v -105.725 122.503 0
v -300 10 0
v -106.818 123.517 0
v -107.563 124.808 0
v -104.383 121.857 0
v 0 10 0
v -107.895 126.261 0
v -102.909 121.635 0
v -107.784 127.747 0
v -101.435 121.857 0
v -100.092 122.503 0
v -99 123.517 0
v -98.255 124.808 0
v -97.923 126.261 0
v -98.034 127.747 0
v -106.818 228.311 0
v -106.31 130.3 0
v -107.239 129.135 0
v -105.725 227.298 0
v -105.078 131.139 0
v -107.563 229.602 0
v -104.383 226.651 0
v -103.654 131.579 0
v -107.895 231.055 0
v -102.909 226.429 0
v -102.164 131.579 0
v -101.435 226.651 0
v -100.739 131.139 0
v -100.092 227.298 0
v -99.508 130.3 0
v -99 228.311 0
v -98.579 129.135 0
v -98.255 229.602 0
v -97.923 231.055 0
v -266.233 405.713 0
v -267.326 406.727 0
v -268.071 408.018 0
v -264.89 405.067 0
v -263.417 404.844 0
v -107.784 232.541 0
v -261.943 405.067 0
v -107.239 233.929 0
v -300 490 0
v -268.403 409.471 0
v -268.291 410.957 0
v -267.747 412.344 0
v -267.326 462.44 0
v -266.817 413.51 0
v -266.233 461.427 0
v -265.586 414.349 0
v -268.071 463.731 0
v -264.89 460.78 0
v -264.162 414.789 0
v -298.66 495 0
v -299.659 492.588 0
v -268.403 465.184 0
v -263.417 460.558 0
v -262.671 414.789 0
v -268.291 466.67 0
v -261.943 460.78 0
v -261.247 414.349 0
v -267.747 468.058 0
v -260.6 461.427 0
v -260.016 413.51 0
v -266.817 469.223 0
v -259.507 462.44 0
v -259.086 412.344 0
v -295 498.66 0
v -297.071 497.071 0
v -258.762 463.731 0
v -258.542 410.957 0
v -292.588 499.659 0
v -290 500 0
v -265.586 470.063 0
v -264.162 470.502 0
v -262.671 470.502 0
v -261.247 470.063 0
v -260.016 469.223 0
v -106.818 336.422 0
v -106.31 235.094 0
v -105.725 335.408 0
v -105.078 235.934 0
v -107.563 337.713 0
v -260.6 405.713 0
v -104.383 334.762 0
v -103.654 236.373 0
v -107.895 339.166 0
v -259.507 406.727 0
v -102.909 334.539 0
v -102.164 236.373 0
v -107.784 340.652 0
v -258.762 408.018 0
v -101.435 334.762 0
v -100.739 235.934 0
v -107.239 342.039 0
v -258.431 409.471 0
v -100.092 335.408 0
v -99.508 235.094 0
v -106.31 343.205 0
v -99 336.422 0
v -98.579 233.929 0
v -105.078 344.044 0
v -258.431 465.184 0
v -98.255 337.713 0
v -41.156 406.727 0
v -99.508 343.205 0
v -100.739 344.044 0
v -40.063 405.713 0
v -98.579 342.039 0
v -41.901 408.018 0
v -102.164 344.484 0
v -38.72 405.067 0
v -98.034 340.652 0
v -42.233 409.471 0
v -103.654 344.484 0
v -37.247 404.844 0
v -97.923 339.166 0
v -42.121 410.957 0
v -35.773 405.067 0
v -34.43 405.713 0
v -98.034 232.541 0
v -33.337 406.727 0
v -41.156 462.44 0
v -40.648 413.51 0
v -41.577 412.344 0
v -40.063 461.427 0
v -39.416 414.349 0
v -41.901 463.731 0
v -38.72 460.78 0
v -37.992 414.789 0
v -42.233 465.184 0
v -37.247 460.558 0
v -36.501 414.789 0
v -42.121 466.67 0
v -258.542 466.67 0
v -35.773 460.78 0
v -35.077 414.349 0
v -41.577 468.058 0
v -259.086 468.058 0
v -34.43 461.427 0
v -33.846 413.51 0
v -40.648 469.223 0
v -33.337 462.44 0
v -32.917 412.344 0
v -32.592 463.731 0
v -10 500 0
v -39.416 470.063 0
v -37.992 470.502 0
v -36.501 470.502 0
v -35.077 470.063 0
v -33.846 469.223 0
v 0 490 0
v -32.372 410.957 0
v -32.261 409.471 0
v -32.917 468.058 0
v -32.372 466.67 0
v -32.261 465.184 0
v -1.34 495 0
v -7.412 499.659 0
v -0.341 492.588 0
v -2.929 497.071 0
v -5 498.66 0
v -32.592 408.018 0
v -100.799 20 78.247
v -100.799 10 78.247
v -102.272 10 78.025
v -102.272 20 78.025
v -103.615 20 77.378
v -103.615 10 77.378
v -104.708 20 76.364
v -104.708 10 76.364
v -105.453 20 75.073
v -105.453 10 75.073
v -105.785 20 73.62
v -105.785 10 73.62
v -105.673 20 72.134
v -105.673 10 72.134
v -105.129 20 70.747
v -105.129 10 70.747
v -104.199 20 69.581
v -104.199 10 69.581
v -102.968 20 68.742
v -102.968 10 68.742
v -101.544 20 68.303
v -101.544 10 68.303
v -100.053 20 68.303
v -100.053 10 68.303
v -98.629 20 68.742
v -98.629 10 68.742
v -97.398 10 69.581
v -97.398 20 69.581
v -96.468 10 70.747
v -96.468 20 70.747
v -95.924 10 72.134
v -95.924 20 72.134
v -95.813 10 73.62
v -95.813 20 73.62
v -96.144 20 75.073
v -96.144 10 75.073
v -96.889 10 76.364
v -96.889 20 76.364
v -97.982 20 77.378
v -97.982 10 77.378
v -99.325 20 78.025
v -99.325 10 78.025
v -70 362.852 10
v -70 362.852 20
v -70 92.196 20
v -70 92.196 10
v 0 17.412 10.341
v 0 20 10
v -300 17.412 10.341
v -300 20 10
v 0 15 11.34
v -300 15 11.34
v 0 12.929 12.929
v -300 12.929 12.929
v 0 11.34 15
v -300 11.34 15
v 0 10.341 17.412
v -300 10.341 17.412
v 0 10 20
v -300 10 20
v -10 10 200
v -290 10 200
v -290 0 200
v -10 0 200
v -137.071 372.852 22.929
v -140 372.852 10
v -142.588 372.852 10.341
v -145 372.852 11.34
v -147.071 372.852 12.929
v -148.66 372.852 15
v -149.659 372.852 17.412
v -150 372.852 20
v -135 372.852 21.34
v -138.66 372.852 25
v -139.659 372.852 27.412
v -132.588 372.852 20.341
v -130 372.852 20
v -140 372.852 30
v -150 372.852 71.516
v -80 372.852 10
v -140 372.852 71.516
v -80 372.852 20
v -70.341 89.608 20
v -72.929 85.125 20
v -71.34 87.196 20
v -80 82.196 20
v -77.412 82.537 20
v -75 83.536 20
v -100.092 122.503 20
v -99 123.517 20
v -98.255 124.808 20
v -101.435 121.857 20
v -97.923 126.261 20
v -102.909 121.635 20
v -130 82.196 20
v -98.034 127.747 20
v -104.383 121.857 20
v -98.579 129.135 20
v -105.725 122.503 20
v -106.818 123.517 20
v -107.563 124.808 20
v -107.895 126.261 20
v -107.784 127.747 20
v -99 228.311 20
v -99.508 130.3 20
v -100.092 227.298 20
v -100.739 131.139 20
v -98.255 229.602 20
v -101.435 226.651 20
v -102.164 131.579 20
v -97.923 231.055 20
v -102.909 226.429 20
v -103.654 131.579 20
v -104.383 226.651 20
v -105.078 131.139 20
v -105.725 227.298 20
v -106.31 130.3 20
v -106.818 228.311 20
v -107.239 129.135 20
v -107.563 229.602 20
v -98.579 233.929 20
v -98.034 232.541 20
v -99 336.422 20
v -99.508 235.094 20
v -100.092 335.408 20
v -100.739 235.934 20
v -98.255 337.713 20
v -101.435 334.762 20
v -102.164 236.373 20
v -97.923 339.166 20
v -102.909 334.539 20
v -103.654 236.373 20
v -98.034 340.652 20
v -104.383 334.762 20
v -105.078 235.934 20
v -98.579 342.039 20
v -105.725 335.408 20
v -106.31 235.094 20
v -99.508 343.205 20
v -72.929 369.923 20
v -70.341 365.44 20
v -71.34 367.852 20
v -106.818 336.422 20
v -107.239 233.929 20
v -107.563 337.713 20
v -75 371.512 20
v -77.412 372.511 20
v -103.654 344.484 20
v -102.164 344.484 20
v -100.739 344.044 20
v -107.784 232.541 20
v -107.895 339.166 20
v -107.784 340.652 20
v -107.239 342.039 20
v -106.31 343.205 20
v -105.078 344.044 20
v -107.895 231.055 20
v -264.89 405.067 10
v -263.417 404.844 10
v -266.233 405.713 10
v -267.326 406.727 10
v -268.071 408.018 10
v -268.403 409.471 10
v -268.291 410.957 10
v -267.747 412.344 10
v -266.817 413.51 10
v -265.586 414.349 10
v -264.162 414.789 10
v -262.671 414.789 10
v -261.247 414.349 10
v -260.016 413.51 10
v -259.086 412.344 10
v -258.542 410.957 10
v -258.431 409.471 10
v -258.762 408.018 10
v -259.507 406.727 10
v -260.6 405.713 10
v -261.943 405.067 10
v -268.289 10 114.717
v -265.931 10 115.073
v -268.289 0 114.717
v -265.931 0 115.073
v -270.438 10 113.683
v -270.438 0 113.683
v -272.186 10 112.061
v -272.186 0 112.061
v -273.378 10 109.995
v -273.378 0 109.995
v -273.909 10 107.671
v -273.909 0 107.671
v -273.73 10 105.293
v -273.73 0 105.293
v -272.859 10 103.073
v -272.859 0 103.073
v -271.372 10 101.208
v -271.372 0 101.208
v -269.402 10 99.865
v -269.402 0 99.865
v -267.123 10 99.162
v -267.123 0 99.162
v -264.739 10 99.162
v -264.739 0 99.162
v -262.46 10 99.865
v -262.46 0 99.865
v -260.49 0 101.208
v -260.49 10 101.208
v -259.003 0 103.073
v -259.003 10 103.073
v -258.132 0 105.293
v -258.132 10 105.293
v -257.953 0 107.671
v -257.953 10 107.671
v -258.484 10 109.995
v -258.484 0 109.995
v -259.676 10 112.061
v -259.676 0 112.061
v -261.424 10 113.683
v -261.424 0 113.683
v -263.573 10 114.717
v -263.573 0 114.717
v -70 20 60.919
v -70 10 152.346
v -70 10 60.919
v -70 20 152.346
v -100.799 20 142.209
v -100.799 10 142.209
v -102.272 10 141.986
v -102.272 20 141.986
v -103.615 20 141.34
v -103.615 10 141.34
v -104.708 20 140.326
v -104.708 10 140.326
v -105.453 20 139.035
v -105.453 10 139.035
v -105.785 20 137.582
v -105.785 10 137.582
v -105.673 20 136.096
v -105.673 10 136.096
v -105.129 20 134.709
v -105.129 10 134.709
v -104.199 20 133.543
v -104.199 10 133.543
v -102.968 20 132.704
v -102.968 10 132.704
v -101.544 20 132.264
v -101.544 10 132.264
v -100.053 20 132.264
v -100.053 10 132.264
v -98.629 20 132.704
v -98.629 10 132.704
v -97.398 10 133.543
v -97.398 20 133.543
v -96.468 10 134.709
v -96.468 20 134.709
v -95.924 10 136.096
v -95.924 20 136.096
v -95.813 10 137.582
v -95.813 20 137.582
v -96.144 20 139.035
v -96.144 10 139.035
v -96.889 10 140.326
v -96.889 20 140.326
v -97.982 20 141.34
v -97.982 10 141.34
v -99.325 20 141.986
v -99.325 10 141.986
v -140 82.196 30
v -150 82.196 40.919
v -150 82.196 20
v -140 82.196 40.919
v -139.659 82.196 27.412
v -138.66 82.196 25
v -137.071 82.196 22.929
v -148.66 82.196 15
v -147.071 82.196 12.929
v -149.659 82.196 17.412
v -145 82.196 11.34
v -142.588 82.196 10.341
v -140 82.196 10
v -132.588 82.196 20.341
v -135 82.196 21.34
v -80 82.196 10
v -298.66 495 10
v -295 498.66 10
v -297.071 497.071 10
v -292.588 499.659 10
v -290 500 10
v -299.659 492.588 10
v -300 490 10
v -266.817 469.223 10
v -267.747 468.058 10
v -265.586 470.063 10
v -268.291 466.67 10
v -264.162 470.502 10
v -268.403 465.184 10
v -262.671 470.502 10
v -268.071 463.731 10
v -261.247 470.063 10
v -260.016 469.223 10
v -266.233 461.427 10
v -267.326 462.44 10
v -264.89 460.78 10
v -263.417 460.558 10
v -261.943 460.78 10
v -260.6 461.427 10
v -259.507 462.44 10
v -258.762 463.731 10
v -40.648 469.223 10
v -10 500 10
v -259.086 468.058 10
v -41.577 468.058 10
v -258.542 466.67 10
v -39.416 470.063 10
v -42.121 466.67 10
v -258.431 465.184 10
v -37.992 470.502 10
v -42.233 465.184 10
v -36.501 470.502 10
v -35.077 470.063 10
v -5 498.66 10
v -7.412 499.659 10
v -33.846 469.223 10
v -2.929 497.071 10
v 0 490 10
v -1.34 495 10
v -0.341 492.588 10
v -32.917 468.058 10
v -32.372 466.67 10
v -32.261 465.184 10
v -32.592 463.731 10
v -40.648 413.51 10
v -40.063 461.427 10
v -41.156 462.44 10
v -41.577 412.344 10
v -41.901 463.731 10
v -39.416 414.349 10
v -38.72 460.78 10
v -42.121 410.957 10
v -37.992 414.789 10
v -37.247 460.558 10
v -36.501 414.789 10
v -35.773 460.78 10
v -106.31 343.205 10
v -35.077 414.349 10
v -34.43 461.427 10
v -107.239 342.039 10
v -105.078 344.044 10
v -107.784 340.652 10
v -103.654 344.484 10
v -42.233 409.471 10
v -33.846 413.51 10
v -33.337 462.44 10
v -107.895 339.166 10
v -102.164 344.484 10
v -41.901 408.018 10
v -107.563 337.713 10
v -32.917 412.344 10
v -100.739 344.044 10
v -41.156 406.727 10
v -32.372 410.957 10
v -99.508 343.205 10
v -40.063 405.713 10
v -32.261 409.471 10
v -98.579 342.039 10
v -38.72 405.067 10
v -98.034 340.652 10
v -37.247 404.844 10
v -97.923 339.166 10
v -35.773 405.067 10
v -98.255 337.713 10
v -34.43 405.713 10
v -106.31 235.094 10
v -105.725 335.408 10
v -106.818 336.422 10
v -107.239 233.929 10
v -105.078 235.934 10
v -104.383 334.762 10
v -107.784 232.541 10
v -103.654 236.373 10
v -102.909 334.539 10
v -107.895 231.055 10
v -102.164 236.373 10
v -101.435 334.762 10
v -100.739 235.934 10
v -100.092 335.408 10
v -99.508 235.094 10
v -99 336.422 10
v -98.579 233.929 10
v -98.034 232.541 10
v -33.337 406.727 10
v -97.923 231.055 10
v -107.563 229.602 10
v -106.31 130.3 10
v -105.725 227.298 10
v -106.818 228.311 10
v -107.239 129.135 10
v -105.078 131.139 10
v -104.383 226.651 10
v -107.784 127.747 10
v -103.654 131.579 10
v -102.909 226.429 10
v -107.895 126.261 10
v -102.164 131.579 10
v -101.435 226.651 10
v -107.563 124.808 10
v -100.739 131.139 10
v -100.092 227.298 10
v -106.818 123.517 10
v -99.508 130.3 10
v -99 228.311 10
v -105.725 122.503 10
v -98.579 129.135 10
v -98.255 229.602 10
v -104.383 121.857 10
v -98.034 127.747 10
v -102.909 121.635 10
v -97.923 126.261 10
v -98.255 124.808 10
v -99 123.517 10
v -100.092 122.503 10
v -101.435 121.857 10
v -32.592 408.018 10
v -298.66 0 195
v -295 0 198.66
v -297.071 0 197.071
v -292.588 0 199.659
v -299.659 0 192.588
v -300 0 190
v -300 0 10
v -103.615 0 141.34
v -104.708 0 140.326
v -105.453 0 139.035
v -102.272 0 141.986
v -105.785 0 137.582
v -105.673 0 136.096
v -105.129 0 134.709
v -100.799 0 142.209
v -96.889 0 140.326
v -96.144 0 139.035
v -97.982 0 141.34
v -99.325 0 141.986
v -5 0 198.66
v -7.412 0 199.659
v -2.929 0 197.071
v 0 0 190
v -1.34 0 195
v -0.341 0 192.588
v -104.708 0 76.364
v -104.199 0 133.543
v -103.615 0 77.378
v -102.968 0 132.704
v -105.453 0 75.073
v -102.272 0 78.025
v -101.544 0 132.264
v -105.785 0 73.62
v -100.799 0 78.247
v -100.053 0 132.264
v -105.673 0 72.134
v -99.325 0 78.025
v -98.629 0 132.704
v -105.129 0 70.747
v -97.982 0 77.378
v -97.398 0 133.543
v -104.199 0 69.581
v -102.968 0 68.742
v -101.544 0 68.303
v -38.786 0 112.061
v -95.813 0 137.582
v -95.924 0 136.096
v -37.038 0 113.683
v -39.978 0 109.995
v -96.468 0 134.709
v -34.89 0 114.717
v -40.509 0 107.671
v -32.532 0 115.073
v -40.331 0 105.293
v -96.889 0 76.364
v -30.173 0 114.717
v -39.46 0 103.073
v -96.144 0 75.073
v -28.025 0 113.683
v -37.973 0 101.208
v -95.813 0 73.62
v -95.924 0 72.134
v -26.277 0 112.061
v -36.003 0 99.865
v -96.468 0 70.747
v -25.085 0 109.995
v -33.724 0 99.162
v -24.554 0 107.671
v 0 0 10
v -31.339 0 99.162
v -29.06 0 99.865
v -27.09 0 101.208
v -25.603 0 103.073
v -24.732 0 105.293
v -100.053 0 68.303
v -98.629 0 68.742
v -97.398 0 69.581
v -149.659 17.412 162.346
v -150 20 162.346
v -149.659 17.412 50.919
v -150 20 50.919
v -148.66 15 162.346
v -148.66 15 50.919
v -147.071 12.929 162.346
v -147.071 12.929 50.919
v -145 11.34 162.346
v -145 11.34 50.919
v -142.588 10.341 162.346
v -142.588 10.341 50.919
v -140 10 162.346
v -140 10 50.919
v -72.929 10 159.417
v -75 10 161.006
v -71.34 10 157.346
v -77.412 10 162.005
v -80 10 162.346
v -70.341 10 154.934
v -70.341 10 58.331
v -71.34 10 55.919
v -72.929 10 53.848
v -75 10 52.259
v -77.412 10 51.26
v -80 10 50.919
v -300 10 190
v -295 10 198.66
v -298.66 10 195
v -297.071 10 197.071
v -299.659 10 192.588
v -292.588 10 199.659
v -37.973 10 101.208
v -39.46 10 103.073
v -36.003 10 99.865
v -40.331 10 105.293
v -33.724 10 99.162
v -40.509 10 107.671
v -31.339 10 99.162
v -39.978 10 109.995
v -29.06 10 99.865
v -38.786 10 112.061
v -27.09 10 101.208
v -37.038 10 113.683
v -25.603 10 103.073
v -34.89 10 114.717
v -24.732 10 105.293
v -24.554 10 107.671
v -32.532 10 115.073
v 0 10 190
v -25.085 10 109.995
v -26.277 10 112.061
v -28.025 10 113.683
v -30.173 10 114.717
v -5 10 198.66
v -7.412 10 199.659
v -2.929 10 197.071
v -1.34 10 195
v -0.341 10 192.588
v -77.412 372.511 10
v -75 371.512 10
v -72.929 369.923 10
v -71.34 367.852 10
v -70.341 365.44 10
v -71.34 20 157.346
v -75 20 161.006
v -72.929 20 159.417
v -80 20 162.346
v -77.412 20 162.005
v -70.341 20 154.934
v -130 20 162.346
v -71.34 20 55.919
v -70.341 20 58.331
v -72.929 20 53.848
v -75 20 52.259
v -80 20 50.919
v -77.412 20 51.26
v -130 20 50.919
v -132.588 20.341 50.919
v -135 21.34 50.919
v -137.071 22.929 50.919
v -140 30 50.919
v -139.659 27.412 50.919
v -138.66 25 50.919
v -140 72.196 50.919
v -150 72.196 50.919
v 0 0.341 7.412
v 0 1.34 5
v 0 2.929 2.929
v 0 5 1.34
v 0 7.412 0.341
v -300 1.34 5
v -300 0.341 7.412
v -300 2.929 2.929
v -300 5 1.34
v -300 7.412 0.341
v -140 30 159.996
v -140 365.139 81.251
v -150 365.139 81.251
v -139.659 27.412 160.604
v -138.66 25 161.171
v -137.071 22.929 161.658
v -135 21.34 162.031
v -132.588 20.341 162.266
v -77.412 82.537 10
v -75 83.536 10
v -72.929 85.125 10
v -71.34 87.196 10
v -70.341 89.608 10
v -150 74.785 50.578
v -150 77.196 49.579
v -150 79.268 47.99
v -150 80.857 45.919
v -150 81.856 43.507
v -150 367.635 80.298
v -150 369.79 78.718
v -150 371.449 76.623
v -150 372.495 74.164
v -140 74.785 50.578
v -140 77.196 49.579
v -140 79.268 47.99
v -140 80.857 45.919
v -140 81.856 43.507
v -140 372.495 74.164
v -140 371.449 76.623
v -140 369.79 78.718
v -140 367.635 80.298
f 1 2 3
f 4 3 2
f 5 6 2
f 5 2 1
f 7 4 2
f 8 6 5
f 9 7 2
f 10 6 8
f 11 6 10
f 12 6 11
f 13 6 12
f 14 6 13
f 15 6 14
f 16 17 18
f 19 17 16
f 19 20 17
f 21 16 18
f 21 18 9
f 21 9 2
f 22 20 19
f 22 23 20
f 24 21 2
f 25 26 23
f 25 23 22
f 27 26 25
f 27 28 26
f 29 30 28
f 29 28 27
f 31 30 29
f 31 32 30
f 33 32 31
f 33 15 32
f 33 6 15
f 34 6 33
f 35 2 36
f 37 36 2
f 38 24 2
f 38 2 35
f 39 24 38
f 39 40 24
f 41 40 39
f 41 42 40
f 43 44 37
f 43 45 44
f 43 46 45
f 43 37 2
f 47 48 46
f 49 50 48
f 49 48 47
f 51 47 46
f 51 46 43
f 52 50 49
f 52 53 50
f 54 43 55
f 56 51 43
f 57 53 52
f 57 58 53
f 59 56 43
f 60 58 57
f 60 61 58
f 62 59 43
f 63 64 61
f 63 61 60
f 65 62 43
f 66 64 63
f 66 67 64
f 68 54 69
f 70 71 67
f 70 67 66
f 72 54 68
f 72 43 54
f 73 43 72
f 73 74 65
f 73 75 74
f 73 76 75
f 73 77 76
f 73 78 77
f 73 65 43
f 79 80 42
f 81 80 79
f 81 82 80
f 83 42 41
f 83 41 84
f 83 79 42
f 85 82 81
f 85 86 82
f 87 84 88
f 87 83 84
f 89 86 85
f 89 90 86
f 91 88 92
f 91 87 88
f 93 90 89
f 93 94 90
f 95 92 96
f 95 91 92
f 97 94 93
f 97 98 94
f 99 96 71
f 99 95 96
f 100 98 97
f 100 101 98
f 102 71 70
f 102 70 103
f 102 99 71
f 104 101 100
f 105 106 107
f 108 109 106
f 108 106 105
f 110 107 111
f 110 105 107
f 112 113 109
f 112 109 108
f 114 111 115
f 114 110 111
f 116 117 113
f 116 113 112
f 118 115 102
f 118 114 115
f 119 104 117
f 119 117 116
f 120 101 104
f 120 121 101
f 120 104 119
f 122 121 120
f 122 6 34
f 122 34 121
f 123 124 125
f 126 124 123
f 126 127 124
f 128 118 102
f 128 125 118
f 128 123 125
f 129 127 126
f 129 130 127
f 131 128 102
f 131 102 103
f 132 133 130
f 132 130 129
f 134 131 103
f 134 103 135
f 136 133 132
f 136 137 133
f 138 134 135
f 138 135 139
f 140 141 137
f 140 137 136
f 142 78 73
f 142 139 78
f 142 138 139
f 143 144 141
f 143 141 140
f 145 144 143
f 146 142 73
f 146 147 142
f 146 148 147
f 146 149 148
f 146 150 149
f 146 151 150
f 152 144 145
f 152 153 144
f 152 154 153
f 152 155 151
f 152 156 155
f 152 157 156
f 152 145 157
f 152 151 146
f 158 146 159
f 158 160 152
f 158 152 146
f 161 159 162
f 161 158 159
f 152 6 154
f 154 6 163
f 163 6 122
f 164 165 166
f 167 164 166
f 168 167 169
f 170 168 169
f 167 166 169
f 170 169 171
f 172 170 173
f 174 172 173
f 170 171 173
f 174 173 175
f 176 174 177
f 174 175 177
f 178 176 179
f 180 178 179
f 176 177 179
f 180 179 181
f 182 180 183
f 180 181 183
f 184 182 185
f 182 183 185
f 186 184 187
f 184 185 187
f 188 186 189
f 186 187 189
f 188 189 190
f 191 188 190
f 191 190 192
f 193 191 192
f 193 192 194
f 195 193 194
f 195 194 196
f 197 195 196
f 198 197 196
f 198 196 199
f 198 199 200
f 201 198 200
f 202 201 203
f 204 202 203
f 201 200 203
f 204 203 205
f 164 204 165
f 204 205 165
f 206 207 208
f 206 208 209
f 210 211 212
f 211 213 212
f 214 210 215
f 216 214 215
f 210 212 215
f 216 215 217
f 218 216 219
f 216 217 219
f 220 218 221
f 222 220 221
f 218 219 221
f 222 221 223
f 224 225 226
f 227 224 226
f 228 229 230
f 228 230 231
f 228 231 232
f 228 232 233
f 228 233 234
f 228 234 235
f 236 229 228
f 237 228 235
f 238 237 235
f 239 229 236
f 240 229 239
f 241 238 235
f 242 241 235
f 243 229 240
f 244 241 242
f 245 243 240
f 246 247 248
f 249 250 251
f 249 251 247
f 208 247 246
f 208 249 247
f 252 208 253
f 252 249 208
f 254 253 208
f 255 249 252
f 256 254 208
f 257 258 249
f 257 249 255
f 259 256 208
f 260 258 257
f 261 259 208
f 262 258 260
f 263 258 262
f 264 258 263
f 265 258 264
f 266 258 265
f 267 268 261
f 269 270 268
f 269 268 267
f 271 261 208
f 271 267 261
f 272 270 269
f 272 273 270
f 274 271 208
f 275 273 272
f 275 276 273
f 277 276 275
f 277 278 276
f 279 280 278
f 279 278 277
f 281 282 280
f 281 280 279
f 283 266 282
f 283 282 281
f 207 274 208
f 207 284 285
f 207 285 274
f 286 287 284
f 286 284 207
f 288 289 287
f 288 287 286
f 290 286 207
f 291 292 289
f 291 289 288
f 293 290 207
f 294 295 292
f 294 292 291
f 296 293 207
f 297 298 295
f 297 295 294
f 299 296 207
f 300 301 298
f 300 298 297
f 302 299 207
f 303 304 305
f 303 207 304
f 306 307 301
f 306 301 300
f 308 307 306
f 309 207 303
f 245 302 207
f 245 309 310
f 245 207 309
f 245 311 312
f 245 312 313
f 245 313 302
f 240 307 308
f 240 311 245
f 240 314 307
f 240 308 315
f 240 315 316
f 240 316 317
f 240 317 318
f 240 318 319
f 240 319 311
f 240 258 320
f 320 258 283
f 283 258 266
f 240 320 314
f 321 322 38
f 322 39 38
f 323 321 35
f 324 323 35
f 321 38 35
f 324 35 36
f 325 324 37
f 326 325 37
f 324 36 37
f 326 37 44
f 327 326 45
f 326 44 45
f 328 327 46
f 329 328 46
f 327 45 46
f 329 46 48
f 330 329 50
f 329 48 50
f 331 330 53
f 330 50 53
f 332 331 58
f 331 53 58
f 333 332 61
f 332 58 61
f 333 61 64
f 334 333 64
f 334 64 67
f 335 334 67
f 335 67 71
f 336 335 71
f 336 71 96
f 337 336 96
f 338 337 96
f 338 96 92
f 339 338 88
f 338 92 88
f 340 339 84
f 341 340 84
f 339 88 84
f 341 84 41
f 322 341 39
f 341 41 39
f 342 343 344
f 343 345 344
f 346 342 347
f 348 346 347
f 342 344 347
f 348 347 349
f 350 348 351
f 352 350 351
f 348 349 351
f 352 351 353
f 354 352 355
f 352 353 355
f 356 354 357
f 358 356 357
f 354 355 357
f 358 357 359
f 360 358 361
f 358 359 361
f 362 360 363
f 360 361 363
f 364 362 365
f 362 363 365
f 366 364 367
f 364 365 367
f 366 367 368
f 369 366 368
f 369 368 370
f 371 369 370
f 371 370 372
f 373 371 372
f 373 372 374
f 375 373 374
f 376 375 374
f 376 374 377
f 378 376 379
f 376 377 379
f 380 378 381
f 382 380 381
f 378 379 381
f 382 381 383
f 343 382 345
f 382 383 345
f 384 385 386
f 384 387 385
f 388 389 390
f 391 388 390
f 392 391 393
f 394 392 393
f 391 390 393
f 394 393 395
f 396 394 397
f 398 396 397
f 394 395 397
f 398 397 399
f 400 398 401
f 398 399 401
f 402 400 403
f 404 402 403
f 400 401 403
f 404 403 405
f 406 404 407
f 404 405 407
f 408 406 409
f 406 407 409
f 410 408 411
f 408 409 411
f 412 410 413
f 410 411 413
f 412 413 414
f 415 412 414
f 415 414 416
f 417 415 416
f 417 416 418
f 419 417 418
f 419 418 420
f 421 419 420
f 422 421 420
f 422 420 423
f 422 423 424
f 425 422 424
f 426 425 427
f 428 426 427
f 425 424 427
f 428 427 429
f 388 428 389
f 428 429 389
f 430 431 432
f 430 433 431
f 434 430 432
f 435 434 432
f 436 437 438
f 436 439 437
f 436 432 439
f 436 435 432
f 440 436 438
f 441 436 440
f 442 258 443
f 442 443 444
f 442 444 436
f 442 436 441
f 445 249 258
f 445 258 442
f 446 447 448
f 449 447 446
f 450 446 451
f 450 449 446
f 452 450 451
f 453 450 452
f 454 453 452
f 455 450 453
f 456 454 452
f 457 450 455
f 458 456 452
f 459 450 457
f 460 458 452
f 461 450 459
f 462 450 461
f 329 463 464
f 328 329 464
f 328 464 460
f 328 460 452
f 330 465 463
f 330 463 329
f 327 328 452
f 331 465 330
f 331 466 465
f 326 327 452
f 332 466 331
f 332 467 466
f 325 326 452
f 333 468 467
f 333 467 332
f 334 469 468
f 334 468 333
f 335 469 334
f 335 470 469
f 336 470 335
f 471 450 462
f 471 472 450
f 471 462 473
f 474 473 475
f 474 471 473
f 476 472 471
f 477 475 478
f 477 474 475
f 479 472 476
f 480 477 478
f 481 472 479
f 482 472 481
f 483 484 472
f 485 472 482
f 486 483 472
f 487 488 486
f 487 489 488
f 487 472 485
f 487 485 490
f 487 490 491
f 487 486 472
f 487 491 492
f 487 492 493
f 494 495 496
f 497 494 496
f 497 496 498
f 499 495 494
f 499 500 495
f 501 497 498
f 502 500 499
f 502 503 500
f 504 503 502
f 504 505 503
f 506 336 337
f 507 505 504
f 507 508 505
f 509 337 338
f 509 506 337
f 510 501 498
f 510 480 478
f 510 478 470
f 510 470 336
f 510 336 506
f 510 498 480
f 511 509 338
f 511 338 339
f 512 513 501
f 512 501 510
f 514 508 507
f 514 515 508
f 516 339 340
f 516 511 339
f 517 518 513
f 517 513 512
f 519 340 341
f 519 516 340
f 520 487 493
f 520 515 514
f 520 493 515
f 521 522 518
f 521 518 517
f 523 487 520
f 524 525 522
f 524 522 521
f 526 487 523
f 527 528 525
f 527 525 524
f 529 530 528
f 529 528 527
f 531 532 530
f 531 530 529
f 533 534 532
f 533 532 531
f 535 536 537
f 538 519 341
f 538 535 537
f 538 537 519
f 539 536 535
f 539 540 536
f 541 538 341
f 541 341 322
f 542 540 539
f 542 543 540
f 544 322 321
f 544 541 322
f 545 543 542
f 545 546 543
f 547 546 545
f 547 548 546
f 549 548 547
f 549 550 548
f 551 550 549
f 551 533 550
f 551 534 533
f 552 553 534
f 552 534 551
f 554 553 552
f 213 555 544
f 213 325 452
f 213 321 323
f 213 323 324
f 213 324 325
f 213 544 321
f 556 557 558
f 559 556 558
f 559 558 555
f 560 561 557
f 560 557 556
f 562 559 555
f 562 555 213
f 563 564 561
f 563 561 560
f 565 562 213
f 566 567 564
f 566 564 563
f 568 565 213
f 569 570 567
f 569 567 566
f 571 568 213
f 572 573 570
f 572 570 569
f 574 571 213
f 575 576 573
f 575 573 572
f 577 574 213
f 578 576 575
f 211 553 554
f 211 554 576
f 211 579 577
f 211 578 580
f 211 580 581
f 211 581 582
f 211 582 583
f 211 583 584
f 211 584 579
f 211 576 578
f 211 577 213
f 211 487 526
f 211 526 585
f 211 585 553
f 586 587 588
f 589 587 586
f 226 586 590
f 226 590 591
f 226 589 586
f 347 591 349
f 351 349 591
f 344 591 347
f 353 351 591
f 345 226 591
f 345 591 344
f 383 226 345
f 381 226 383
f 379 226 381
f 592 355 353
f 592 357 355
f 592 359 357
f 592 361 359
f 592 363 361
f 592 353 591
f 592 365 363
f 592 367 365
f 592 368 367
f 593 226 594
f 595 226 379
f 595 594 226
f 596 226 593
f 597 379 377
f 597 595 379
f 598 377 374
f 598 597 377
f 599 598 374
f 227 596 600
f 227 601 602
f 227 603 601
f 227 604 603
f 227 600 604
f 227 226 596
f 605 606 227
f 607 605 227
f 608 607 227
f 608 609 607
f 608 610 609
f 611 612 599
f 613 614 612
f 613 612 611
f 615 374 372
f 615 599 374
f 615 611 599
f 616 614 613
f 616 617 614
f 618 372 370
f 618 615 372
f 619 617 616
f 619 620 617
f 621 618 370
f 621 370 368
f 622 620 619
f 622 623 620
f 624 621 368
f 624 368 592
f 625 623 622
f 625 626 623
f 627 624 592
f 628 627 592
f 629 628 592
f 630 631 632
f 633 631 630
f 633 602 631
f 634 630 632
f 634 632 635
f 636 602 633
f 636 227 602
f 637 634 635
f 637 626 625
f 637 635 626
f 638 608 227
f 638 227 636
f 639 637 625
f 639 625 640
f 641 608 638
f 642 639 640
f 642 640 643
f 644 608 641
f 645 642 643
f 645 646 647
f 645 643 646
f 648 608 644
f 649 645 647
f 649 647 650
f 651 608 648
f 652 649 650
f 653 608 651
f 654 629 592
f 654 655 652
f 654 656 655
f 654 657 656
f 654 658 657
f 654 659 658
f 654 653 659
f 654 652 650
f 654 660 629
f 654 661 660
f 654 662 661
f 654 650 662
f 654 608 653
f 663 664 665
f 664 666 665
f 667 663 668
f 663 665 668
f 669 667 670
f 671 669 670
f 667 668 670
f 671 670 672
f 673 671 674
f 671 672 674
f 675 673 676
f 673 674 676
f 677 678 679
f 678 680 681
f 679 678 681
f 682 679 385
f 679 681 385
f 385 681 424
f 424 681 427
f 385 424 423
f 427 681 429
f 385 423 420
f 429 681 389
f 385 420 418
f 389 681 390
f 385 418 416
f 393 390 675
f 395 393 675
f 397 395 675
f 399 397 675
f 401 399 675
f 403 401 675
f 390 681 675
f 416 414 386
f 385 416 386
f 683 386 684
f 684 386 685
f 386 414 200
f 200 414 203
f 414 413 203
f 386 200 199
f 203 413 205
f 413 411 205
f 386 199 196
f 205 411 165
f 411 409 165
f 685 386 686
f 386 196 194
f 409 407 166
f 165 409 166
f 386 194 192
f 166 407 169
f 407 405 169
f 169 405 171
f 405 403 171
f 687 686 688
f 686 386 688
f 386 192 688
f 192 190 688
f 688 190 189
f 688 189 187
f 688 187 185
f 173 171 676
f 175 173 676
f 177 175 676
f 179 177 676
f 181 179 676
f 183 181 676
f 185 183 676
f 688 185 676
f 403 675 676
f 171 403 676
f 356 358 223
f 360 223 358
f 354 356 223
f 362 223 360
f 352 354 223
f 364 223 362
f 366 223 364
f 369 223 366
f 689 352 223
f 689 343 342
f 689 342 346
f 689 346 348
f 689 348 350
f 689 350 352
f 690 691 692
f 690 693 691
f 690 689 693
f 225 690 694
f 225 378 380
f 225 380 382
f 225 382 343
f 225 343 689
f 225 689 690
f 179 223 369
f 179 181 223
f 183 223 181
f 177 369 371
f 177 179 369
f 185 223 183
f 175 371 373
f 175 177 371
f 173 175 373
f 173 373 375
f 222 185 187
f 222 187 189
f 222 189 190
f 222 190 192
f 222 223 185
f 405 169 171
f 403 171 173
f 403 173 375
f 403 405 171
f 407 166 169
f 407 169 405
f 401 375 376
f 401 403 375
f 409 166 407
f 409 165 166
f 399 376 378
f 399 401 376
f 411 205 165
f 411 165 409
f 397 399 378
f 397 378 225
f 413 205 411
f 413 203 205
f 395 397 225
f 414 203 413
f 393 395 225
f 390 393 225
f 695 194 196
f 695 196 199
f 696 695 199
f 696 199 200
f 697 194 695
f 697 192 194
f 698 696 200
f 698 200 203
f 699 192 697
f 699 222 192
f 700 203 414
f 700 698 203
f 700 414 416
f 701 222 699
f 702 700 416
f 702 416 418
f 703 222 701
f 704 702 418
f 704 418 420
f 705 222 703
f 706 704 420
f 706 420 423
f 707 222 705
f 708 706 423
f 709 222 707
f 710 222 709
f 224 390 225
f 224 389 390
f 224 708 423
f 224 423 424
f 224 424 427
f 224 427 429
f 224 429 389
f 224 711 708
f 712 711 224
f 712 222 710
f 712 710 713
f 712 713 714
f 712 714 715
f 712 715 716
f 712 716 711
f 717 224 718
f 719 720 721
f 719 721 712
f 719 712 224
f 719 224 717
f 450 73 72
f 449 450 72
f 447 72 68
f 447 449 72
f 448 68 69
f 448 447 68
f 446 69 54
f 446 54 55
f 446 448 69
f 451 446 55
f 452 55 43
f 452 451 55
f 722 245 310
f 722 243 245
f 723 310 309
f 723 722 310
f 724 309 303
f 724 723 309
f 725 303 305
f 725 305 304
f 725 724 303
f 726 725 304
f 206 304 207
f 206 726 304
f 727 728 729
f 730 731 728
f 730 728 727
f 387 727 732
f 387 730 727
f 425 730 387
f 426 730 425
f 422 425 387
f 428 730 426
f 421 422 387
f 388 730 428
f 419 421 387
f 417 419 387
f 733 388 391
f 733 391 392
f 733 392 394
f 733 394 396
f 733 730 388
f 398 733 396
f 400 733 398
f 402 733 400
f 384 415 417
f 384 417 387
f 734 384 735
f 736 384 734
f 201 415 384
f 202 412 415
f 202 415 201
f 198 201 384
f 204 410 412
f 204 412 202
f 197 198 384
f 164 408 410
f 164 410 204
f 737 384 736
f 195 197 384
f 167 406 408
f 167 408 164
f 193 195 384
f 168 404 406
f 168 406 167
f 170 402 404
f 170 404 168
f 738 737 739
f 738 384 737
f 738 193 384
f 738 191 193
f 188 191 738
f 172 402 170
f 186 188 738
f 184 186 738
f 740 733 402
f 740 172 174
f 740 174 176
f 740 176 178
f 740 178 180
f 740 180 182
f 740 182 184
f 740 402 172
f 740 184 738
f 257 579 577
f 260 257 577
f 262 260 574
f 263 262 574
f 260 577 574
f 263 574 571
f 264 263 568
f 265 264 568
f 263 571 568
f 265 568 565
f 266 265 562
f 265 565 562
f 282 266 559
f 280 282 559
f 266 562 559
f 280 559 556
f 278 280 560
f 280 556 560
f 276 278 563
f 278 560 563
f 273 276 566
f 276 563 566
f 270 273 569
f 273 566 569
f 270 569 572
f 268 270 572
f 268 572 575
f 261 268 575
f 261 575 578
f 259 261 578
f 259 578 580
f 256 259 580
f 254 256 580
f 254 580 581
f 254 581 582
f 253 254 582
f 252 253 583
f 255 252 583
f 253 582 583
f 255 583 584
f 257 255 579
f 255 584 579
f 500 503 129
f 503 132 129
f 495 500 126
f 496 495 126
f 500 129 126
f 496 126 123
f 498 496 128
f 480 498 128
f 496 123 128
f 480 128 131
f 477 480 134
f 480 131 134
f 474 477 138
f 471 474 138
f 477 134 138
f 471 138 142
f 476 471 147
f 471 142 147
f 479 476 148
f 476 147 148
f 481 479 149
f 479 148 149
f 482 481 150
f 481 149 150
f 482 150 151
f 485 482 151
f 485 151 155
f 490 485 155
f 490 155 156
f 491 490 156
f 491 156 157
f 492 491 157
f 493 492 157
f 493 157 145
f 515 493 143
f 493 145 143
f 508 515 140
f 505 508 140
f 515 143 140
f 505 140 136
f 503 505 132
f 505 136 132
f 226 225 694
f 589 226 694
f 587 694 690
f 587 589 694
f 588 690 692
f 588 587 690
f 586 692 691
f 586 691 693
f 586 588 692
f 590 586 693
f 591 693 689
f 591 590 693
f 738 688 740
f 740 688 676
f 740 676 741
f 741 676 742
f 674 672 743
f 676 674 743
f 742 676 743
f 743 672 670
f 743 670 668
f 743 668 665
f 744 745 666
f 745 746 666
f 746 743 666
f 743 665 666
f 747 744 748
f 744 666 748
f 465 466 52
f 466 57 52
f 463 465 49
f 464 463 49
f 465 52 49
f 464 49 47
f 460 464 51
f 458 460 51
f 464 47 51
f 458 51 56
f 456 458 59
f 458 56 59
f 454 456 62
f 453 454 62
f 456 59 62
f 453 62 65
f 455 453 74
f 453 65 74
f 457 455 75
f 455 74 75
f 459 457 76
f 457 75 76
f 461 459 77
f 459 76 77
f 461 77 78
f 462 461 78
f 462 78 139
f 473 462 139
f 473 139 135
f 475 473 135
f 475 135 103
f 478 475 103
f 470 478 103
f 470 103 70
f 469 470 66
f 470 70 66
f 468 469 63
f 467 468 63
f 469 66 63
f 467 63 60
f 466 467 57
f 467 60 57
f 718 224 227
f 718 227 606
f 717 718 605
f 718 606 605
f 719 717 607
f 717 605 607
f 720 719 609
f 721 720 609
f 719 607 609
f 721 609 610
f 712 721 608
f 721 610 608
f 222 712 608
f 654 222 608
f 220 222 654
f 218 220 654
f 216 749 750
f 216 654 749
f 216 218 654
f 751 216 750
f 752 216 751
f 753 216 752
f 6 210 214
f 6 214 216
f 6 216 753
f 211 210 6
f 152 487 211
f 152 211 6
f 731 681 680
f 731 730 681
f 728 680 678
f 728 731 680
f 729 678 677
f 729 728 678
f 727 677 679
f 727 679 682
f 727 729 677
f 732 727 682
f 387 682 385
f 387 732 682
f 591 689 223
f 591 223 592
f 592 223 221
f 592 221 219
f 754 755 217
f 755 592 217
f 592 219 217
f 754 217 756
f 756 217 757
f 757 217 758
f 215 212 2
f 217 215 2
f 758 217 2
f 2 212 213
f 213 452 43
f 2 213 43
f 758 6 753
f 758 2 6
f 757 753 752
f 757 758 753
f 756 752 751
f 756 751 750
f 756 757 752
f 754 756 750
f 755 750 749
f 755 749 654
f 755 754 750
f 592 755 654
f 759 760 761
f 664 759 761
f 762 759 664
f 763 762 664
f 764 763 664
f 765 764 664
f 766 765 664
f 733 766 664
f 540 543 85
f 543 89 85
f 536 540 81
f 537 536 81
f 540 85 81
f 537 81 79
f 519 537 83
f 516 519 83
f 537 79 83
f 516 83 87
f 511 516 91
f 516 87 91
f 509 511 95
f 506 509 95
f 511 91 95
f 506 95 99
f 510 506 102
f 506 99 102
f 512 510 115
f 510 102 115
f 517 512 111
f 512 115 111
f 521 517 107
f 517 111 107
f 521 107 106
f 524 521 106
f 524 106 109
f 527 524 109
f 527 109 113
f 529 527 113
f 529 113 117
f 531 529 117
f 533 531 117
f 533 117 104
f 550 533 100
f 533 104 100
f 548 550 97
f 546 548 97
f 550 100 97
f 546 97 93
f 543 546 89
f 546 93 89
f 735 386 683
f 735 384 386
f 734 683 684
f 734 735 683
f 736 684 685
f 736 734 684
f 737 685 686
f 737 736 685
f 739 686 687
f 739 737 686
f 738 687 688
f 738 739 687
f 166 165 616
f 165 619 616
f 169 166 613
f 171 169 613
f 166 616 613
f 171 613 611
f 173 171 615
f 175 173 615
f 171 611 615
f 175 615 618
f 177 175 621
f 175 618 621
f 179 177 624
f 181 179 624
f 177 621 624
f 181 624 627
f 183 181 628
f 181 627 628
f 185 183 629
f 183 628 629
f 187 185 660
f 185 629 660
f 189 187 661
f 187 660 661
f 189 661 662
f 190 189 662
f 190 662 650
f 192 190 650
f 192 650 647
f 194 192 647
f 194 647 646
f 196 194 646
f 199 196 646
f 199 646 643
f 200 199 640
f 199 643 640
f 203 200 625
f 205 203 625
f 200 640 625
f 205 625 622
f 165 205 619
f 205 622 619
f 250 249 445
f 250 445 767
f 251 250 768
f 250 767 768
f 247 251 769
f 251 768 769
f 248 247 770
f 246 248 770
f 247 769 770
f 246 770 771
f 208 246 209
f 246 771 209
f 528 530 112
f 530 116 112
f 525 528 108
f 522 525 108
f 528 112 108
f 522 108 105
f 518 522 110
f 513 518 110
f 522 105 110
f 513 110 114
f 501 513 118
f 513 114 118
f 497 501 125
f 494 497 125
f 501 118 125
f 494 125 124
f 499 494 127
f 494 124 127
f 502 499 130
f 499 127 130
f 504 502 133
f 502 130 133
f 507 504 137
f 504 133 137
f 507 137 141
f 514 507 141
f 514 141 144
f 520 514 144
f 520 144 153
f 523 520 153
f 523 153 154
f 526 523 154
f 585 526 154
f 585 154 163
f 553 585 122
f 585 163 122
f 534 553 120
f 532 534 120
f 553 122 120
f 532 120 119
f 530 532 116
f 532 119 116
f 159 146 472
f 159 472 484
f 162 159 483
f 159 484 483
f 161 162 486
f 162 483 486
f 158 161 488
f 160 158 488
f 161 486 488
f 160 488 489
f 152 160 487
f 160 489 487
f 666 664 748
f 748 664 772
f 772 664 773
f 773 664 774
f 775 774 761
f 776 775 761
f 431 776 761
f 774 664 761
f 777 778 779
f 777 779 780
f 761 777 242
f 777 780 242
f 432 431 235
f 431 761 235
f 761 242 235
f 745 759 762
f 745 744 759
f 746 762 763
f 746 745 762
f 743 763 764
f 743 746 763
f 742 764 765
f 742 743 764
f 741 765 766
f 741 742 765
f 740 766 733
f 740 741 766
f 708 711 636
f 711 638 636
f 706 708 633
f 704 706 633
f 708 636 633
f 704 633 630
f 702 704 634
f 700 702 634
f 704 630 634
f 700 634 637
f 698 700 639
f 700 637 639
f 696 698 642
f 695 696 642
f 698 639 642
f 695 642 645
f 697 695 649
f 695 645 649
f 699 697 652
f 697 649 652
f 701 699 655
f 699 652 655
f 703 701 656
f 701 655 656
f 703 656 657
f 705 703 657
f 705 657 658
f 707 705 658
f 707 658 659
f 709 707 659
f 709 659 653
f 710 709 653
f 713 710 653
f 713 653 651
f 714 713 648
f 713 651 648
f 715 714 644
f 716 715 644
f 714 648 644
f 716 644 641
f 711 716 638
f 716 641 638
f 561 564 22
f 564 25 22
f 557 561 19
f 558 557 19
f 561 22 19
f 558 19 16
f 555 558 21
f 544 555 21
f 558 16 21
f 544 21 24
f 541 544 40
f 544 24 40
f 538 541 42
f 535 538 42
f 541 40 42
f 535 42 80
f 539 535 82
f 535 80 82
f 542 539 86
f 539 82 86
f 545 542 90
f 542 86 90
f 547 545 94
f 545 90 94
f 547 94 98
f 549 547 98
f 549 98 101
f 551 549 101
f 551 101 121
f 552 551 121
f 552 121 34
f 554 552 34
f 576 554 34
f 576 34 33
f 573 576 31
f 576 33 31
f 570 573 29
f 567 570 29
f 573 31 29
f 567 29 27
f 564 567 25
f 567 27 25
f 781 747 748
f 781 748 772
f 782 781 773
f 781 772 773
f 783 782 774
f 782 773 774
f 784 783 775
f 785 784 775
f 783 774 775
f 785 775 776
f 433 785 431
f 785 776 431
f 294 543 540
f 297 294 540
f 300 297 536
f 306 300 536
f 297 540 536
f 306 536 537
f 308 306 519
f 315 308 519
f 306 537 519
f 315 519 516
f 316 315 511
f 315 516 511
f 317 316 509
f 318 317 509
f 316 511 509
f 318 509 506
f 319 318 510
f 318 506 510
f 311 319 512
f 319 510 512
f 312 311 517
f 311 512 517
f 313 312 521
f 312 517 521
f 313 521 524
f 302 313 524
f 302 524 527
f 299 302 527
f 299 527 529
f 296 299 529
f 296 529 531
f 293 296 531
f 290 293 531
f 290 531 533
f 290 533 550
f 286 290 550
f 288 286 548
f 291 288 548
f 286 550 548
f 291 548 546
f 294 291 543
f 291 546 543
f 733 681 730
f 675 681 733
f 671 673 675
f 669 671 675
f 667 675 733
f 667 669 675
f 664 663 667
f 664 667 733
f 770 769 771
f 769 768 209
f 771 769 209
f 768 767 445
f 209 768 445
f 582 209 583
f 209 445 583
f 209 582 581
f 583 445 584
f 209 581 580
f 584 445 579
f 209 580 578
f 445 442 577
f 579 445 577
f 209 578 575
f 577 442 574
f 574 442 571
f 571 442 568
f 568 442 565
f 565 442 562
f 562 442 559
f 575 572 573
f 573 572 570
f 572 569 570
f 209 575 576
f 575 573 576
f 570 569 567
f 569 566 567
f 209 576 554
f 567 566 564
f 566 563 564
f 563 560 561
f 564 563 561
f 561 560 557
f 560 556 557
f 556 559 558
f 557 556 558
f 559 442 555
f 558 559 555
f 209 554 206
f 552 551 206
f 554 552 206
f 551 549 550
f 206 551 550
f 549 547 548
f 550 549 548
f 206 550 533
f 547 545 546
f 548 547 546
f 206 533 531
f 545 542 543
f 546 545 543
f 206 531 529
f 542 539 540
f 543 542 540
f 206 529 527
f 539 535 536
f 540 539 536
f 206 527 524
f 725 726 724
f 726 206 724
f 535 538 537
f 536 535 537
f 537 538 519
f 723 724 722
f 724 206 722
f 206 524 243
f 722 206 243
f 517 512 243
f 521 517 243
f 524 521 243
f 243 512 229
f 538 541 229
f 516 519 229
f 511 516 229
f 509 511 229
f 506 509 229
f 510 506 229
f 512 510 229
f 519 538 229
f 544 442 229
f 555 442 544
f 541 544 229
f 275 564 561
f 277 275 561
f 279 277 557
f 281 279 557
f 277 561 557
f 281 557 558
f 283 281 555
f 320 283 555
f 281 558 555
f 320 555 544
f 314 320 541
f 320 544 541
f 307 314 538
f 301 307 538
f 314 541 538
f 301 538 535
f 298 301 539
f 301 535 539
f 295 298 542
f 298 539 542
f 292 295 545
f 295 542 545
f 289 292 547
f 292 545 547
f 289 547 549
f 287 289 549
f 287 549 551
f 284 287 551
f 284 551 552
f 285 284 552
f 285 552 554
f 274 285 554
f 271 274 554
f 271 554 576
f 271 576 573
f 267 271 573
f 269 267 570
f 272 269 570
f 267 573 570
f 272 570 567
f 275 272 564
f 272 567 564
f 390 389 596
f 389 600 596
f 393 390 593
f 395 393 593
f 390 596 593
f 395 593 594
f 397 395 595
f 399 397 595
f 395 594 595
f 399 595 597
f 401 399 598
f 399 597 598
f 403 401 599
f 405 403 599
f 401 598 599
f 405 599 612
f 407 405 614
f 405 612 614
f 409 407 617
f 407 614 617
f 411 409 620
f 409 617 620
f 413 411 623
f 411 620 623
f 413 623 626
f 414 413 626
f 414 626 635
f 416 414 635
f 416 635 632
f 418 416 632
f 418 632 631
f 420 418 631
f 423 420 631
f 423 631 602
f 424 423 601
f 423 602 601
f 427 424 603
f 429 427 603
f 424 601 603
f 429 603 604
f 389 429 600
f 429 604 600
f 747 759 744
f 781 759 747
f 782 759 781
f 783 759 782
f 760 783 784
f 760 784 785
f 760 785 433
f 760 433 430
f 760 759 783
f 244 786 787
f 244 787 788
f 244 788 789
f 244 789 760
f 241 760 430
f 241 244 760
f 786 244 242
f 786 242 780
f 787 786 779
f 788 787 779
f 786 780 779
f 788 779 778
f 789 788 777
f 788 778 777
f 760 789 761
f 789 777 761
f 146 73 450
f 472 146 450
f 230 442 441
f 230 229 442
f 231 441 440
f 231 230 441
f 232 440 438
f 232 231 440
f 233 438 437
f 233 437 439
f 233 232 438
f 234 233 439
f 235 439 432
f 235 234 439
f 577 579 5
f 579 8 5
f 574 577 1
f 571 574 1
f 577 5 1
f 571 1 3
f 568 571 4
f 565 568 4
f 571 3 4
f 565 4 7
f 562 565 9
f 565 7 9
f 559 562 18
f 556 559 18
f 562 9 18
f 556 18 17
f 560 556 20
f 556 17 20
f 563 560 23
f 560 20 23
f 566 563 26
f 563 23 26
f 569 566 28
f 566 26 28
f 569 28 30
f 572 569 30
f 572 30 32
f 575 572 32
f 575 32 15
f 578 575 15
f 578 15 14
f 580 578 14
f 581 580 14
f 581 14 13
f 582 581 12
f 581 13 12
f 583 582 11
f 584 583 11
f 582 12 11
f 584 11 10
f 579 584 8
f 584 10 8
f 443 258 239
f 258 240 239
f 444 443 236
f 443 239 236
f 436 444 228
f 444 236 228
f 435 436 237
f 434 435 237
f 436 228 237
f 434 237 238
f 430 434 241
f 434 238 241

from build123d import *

# Parameters (mm, degrees)
BOSS_EXTRUDE1_DEPTH             = 300
BOSS_EXTRUDE2_START             = -140
BOSS_EXTRUDE2_DEPTH             = 10
BOSS_EXTRUDE3_START             = -150
SKETCH2_3_W                     = 111.42684815
SKETCH2_3_H                     = 10
SKETCH2_3_W_2                   = 10
SKETCH2_3_H_2                   = 290.655213081
BOSS_EXTRUDE3_DEPTH             = 80
FILLET1_R                       = 10
FILLET2_R                       = 10
SKETCH4_W                       = 5
SKETCH4_H                       = 20
F_10_0MM_DOWEL_HOLE1_AT_2_COUNT = 2
F_10_0MM_DOWEL_HOLE1_AT_2_PITCH = 108.110572907
F_10_0MM_DOWEL_HOLE1_AT_3_COUNT = 2
F_10_0MM_DOWEL_HOLE1_AT_3_PITCH = 212.904870572
F_10_0MM_DOWEL_HOLE1_AT_4_COUNT = 2
F_10_0MM_DOWEL_HOLE1_AT_4_PITCH = 142.099201661
F_10_0MM_DOWEL_HOLE1_AT_5_COUNT = 2
F_10_0MM_DOWEL_HOLE1_AT_5_PITCH = 96.199423156
F_10_0MM_DOWEL_HOLE1_AT_6_COUNT = 2
F_10_0MM_DOWEL_HOLE1_AT_6_PITCH = 175.229925254
F_10_0MM_DOWEL_HOLE1_AT_7_COUNT = 2
F_10_0MM_DOWEL_HOLE1_AT_7_PITCH = 204.067098773
SKETCH7_W                       = 5
SKETCH7_H                       = 20
F_10_0MM_DOWEL_HOLE2_AT_2_COUNT = 2
F_10_0MM_DOWEL_HOLE2_AT_2_PITCH = 63.961905042
SKETCH9_W                       = 8
SKETCH9_H                       = 10
F_16_0MM_DOWEL_HOLE1_AT_2_COUNT = 2
F_16_0MM_DOWEL_HOLE1_AT_2_PITCH = 233.399451571


with BuildPart() as part:
    # Sketch1 → Boss-Extrude1 (new body)
    with BuildSketch(Plane(origin=(0, 0, 0), x_dir=(0, 0, -1), z_dir=(1, 0, 0))):
        Polygon((0, 0), (0, 500), (-10, 500), (-10, 10), (-200, 10), (-200, 0), align=None)
    extrude(amount=-BOSS_EXTRUDE1_DEPTH)

    # Fillet1
    fillet1_edges = [part.edges().sort_by_distance(p)[0] for p in [
        (-300, 500, 5),
        (-150, 0, 0),
        (-150, 10, 10),
        (-300, 5, 200),
        (0, 5, 200),
        (0, 500, 5),
    ]]
    fillet(fillet1_edges, radius=FILLET1_R)


with BuildPart() as body_2:
    # Sketch2 → Boss-Extrude2 (new body)
    with BuildSketch(Plane(origin=(0, 0, 0), x_dir=(0, 0, -1), z_dir=(1, 0, 0)).offset(BOSS_EXTRUDE2_START)):
        Polygon((-20, 82.196472727), (-20, 372.851685808), (-79.439093496, 372.851685808), (-162.34597456, 20), (-50.91912641, 20), (-50.91912641, 82.196472727), align=None)
    extrude(amount=-BOSS_EXTRUDE2_DEPTH)

    # Sketch2<3> → Boss-Extrude3 (add)
    with BuildSketch(Plane(origin=(0, 0, 0), x_dir=(0, 0, -1), z_dir=(1, 0, 0)).offset(BOSS_EXTRUDE3_START)):
        with Locations((-106.632550485, 15)):
            Rectangle(SKETCH2_3_W, SKETCH2_3_H)
        with Locations((-15, 227.524079268)):
            Rectangle(SKETCH2_3_W_2, SKETCH2_3_H_2)
    extrude(amount=BOSS_EXTRUDE3_DEPTH)

    # Fillet2
    fillet2_edges = [body_2.edges().sort_by_distance(p)[0] for p in [
        (-145, 82.196472727, 50.91912641),
        (-150, 10, 106.632550485),
        (-70, 15, 50.91912641),
        (-70, 15, 162.34597456),
        (-70, 82.196472727, 15),
        (-140, 227.524079267, 20),
        (-145, 372.851685808, 79.439093496),
        (-70, 372.851685808, 15),
        (-150, 227.524079267, 10),
        (-140, 20, 106.632550485),
    ]]
    fillet(fillet2_edges, radius=FILLET2_R)


with BuildPart() as f_10_0mm_dowel_hole1_tool:
    # Sketch4 → Ø10.0mm Dowel Hole1 (revolve)
    with BuildSketch(Plane(origin=(-102.908891556, 339.539431549, 20), x_dir=(0, -1, 0), z_dir=(1, 0, 0))):
        with Locations((2.5, 10)):
            Rectangle(SKETCH4_W, SKETCH4_H)
    f_10_0mm_dowel_hole1 = revolve(axis=Axis((-102.908891556, 339.539431549, 26.35), (0, 0, -1)))


with BuildPart() as part_1:
    add(part.part)

    # Ø10.0mm Dowel Hole1: cut by f_10_0mm_dowel_hole1_tool
    add(f_10_0mm_dowel_hole1_tool.part, mode=Mode.SUBTRACT)


with BuildPart() as body_2_1:
    add(body_2.part)

    # Ø10.0mm Dowel Hole1: cut by f_10_0mm_dowel_hole1_tool
    add(f_10_0mm_dowel_hole1_tool.part, mode=Mode.SUBTRACT)


with BuildPart() as f_10_0mm_dowel_hole1_at_2_tool:
    # Ø10.0mm Dowel Hole1 at 2: Ø10.0mm Dowel Hole1 ×2
    with Locations(*[(0, -i * F_10_0MM_DOWEL_HOLE1_AT_2_PITCH, 0) for i in range(1, F_10_0MM_DOWEL_HOLE1_AT_2_COUNT)]):
        add(f_10_0mm_dowel_hole1)


with BuildPart() as part_2:
    add(part_1.part)

    # Ø10.0mm Dowel Hole1 at 2: cut by f_10_0mm_dowel_hole1_at_2_tool
    add(f_10_0mm_dowel_hole1_at_2_tool.part, mode=Mode.SUBTRACT)


with BuildPart() as body_2_2:
    add(body_2_1.part)

    # Ø10.0mm Dowel Hole1 at 2: cut by f_10_0mm_dowel_hole1_at_2_tool
    add(f_10_0mm_dowel_hole1_at_2_tool.part, mode=Mode.SUBTRACT)


with BuildPart() as f_10_0mm_dowel_hole1_at_3_tool:
    # Ø10.0mm Dowel Hole1 at 3: Ø10.0mm Dowel Hole1 ×2
    with Locations(*[(0, -i * F_10_0MM_DOWEL_HOLE1_AT_3_PITCH, 0) for i in range(1, F_10_0MM_DOWEL_HOLE1_AT_3_COUNT)]):
        add(f_10_0mm_dowel_hole1)


with BuildPart() as part_3:
    add(part_2.part)

    # Ø10.0mm Dowel Hole1 at 3: cut by f_10_0mm_dowel_hole1_at_3_tool
    add(f_10_0mm_dowel_hole1_at_3_tool.part, mode=Mode.SUBTRACT)

    # Ø10.0mm Dowel Hole1 at 4: Ø10.0mm Dowel Hole1 ×2
    with Locations(*[Vector(0.462087394, 0.886834393, 0) * (i * F_10_0MM_DOWEL_HOLE1_AT_4_PITCH) for i in range(1, F_10_0MM_DOWEL_HOLE1_AT_4_COUNT)]):
        add(f_10_0mm_dowel_hole1, mode=Mode.SUBTRACT)

    # Ø10.0mm Dowel Hole1 at 5: Ø10.0mm Dowel Hole1 ×2
    with Locations(*[Vector(0.682563862, 0.730825953, 0) * (i * F_10_0MM_DOWEL_HOLE1_AT_5_PITCH) for i in range(1, F_10_0MM_DOWEL_HOLE1_AT_5_COUNT)]):
        add(f_10_0mm_dowel_hole1, mode=Mode.SUBTRACT)

    # Ø10.0mm Dowel Hole1 at 6: Ø10.0mm Dowel Hole1 ×2
    with Locations(*[Vector(-0.915983509, 0.401215917, 0) * (i * F_10_0MM_DOWEL_HOLE1_AT_6_PITCH) for i in range(1, F_10_0MM_DOWEL_HOLE1_AT_6_COUNT)]):
        add(f_10_0mm_dowel_hole1, mode=Mode.SUBTRACT)

    # Ø10.0mm Dowel Hole1 at 7: Ø10.0mm Dowel Hole1 ×2
    with Locations(*[Vector(-0.786543851, 0.617534429, 0) * (i * F_10_0MM_DOWEL_HOLE1_AT_7_PITCH) for i in range(1, F_10_0MM_DOWEL_HOLE1_AT_7_COUNT)]):
        add(f_10_0mm_dowel_hole1, mode=Mode.SUBTRACT)


with BuildPart() as body_2_3:
    add(body_2_2.part)

    # Ø10.0mm Dowel Hole1 at 3: cut by f_10_0mm_dowel_hole1_at_3_tool
    add(f_10_0mm_dowel_hole1_at_3_tool.part, mode=Mode.SUBTRACT)


with BuildPart() as f_10_0mm_dowel_hole2_tool:
    # Sketch7 → Ø10.0mm Dowel Hole2 (revolve)
    with BuildSketch(Plane(origin=(-100.798534583, 20, 73.24670318), x_dir=(0, 0, 1), z_dir=(1, 0, 0))):
        with Locations((2.5, 10)):
            Rectangle(SKETCH7_W, SKETCH7_H)
    f_10_0mm_dowel_hole2 = revolve(axis=Axis((-100.798534583, 26.35, 73.24670318), (0, -1, 0)))


with BuildPart() as part_4:
    add(part_3.part)

    # Ø10.0mm Dowel Hole2: cut by f_10_0mm_dowel_hole2_tool
    add(f_10_0mm_dowel_hole2_tool.part, mode=Mode.SUBTRACT)


with BuildPart() as body_2_4:
    add(body_2_3.part)

    # Ø10.0mm Dowel Hole2: cut by f_10_0mm_dowel_hole2_tool
    add(f_10_0mm_dowel_hole2_tool.part, mode=Mode.SUBTRACT)


with BuildPart() as f_10_0mm_dowel_hole2_at_2_tool:
    # Ø10.0mm Dowel Hole2 at 2: Ø10.0mm Dowel Hole2 ×2
    with Locations(*[(0, 0, i * F_10_0MM_DOWEL_HOLE2_AT_2_PITCH) for i in range(1, F_10_0MM_DOWEL_HOLE2_AT_2_COUNT)]):
        add(f_10_0mm_dowel_hole2)


with BuildPart() as part_5:
    add(part_4.part)

    # Ø10.0mm Dowel Hole2 at 2: cut by f_10_0mm_dowel_hole2_at_2_tool
    add(f_10_0mm_dowel_hole2_at_2_tool.part, mode=Mode.SUBTRACT)

    # Sketch9 → Ø16.0mm Dowel Hole1 (revolve, cut)
    with BuildSketch(Plane(origin=(-32.531501317, 10, 107.072710654), x_dir=(0, 0, 1), z_dir=(1, 0, 0))):
        with Locations((4, 5)):
            Rectangle(SKETCH9_W, SKETCH9_H)
    f_16_0mm_dowel_hole1 = revolve(axis=Axis((-32.531501317, 16.35, 107.072710654), (0, -1, 0)), mode=Mode.SUBTRACT)

    # Ø16.0mm Dowel Hole1 at 2: Ø16.0mm Dowel Hole1 ×2
    with Locations(*[(-i * F_16_0MM_DOWEL_HOLE1_AT_2_PITCH, 0, 0) for i in range(1, F_16_0MM_DOWEL_HOLE1_AT_2_COUNT)]):
        add(f_16_0mm_dowel_hole1, mode=Mode.SUBTRACT)


with BuildPart() as body_2_5:
    add(body_2_4.part)

    # Ø10.0mm Dowel Hole2 at 2: cut by f_10_0mm_dowel_hole2_at_2_tool
    add(f_10_0mm_dowel_hole2_at_2_tool.part, mode=Mode.SUBTRACT)


solid = Compound([part_5.part, body_2_5.part])
